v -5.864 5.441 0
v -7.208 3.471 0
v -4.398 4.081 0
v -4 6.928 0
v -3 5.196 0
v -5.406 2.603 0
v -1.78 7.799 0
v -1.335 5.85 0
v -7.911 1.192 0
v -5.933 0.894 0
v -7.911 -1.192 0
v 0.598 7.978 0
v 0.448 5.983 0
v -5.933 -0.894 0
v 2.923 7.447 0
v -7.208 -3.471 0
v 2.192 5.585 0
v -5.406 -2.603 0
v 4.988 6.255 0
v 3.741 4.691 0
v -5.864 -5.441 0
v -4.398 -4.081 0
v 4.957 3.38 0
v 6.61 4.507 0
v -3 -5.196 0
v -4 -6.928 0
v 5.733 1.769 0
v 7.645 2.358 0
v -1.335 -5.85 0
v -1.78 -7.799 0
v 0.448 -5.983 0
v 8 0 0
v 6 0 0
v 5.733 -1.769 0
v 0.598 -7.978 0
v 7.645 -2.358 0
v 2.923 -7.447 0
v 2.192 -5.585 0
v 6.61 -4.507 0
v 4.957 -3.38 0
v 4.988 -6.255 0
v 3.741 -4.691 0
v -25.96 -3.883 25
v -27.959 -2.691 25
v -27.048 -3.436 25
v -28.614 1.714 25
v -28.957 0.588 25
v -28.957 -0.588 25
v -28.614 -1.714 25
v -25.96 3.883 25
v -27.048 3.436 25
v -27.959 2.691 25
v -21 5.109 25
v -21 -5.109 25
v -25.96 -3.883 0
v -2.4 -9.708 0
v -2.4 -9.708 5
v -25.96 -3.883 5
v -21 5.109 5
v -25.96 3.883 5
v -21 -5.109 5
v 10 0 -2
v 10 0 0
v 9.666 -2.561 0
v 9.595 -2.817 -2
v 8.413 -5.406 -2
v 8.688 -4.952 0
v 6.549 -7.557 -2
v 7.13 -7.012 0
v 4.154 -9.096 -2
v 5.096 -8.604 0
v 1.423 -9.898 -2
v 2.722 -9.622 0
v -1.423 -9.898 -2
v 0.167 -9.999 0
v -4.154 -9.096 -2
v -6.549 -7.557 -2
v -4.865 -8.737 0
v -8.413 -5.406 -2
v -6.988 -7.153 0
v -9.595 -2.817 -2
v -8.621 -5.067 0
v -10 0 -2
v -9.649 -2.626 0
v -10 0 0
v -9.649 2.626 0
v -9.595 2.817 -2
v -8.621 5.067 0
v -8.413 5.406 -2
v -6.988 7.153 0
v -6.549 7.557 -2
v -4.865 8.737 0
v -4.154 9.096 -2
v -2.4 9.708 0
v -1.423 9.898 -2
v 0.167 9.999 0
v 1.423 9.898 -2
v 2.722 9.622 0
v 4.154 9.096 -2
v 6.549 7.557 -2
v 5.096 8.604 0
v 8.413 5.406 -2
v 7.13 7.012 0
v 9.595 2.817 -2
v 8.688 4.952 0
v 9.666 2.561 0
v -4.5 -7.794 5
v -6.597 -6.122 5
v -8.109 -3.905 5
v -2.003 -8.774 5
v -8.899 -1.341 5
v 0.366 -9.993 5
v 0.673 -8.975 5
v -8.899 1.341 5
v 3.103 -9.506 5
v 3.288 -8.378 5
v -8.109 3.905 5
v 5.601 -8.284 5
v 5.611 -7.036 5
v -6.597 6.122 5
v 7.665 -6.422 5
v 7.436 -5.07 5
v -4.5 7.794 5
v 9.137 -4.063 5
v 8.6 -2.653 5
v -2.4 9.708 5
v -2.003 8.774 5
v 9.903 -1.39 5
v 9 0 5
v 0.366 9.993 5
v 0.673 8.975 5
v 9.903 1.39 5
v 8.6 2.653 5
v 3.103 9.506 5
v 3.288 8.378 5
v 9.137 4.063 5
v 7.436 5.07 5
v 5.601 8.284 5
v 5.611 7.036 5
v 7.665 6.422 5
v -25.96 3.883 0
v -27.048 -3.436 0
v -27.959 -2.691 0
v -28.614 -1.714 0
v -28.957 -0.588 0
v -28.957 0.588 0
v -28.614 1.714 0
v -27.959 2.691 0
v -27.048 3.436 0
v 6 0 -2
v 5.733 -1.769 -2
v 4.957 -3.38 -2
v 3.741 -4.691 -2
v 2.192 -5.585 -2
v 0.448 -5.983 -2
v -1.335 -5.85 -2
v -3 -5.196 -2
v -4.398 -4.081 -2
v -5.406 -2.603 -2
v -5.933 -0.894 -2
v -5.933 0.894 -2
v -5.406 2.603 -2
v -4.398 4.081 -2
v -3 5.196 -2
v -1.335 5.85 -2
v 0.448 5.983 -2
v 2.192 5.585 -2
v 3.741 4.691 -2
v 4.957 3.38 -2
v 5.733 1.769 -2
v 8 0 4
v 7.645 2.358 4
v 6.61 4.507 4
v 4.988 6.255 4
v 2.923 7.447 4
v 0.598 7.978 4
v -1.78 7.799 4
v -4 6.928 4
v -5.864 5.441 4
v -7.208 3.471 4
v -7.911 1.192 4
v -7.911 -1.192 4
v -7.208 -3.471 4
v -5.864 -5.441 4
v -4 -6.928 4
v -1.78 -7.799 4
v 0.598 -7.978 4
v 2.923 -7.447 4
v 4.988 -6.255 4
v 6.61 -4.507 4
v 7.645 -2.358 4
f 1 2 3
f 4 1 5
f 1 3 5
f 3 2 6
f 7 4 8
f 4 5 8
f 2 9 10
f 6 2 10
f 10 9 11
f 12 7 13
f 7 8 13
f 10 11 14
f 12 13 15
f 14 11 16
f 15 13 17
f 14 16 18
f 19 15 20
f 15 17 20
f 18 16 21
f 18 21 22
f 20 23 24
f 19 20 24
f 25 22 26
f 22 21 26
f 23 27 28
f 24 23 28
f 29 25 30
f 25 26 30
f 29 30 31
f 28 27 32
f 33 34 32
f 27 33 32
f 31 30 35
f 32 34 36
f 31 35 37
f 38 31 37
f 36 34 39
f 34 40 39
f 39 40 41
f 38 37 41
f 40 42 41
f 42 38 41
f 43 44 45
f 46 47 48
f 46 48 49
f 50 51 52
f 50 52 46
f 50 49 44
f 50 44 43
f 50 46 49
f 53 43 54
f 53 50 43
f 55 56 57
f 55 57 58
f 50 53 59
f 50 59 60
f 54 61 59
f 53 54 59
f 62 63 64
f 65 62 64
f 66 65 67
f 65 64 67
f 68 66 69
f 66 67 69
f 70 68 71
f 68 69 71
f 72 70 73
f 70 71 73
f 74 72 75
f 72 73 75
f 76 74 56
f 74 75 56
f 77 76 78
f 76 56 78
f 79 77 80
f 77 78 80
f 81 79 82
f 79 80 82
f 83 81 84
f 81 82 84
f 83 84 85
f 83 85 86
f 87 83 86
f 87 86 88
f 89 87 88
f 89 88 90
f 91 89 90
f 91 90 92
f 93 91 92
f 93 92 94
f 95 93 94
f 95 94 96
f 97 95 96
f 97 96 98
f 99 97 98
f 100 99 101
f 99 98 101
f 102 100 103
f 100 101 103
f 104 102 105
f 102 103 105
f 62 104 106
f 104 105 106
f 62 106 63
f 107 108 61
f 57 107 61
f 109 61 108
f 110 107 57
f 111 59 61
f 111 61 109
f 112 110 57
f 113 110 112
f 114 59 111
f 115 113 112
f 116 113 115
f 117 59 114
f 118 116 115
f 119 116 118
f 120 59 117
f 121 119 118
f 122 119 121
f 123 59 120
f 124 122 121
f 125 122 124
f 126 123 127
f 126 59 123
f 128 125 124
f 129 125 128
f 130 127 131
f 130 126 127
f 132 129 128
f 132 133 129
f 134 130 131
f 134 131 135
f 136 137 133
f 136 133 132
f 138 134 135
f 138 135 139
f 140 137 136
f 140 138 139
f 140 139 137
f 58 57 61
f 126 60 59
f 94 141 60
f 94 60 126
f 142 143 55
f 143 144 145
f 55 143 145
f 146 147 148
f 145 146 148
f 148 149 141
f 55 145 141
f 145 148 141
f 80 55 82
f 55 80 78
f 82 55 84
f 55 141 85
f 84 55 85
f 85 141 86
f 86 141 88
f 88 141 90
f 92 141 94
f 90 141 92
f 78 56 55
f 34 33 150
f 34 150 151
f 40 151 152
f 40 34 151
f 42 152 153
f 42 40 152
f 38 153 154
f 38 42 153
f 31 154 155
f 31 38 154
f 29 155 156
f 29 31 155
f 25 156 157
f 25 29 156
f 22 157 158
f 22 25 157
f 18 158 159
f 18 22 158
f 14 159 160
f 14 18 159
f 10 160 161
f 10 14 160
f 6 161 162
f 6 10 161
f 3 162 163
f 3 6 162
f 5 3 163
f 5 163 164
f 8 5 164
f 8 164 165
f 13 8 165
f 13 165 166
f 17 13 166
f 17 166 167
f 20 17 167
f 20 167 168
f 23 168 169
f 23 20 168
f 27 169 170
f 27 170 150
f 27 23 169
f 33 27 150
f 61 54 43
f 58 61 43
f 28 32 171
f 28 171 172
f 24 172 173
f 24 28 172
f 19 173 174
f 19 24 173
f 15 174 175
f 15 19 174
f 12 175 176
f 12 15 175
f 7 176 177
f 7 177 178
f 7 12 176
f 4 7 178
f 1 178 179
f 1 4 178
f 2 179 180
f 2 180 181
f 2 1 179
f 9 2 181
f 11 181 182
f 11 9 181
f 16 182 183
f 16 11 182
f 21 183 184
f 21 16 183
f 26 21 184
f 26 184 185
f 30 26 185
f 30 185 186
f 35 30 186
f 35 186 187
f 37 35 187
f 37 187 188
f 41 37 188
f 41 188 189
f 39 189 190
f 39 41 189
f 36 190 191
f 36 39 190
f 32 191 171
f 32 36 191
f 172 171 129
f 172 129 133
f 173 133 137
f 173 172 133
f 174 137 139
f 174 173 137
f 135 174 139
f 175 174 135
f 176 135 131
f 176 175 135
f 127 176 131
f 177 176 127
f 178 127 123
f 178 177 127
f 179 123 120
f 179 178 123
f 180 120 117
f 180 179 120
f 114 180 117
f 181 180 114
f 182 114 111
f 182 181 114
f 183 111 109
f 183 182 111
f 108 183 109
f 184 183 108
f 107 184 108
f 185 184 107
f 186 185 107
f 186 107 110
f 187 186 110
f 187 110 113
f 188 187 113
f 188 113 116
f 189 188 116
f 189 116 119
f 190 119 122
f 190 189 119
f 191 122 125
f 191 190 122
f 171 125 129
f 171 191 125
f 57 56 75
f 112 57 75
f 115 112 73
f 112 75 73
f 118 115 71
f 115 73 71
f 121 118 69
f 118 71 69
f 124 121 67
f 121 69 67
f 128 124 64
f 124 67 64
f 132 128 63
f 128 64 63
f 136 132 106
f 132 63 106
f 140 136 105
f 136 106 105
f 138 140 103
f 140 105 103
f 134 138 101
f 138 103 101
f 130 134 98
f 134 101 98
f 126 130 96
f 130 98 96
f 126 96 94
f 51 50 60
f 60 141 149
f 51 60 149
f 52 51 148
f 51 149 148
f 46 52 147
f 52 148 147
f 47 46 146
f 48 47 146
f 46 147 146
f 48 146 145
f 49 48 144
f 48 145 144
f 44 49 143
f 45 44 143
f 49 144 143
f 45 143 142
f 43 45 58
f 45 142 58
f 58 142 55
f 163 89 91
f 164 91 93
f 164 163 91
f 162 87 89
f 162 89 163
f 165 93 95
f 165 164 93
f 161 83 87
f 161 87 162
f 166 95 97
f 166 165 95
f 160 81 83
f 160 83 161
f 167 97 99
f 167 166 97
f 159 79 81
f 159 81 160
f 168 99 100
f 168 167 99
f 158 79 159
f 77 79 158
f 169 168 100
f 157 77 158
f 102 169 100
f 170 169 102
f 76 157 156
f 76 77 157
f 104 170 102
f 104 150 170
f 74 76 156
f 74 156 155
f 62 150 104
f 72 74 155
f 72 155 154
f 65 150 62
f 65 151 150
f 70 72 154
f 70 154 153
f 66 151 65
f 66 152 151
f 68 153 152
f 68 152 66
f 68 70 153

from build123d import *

# Parameters (mm, degrees)
SKETCH_R      = 8
PAD_DEPTH     = 5
PAD001_DEPTH  = 20
CHAMFER_SIZE  = 1
SKETCH002_R   = 10
SKETCH002_R_2 = 6
PAD002_DEPTH  = 2


with BuildPart() as part:
    # Sketch → Pad (new body)
    with BuildSketch(Plane.XY):
        with BuildLine():
            ThreePointArc((-2.4, -9.707729), (10, 0), (-2.4, 9.707729))
            Line((-25.96, 3.883092), (-2.4, 9.707729))
            ThreePointArc((-25.96, 3.883092), (-29, 0), (-25.96, -3.883092))
            Line((-2.4, -9.707729), (-25.96, -3.883092))
        make_face()
        Circle(SKETCH_R, mode=Mode.SUBTRACT)
    extrude(amount=PAD_DEPTH)

    # Sketch001 (on Face7 of Pad) → Pad001 (join)
    with BuildSketch(Plane.XY.offset(5)):
        with BuildLine():
            ThreePointArc((-25.96, 3.883092), (-29, 0), (-25.96, -3.883092))
            Line((-21, -5.109331), (-25.96, -3.883092))
            Line((-21, -5.109331), (-21, 5.109331))
            Line((-21, 5.109331), (-25.96, 3.883092))
        make_face()
    extrude(amount=PAD001_DEPTH)

    # Chamfer
    chamfer_edges = [part.edges().sort_by_distance(p)[0] for p in [
        (-8, 0, 5),
    ]]
    chamfer(chamfer_edges, length=CHAMFER_SIZE)

    # Sketch002 (on Face9 of Chamfer) → Pad002 (join)
    with BuildSketch(Plane(origin=(0, 0, 0), x_dir=(1, 0, 0), z_dir=(0, 0, -1))):
        Circle(SKETCH002_R)
        Circle(SKETCH002_R_2, mode=Mode.SUBTRACT)
    extrude(amount=PAD002_DEPTH)


solid = part.part
